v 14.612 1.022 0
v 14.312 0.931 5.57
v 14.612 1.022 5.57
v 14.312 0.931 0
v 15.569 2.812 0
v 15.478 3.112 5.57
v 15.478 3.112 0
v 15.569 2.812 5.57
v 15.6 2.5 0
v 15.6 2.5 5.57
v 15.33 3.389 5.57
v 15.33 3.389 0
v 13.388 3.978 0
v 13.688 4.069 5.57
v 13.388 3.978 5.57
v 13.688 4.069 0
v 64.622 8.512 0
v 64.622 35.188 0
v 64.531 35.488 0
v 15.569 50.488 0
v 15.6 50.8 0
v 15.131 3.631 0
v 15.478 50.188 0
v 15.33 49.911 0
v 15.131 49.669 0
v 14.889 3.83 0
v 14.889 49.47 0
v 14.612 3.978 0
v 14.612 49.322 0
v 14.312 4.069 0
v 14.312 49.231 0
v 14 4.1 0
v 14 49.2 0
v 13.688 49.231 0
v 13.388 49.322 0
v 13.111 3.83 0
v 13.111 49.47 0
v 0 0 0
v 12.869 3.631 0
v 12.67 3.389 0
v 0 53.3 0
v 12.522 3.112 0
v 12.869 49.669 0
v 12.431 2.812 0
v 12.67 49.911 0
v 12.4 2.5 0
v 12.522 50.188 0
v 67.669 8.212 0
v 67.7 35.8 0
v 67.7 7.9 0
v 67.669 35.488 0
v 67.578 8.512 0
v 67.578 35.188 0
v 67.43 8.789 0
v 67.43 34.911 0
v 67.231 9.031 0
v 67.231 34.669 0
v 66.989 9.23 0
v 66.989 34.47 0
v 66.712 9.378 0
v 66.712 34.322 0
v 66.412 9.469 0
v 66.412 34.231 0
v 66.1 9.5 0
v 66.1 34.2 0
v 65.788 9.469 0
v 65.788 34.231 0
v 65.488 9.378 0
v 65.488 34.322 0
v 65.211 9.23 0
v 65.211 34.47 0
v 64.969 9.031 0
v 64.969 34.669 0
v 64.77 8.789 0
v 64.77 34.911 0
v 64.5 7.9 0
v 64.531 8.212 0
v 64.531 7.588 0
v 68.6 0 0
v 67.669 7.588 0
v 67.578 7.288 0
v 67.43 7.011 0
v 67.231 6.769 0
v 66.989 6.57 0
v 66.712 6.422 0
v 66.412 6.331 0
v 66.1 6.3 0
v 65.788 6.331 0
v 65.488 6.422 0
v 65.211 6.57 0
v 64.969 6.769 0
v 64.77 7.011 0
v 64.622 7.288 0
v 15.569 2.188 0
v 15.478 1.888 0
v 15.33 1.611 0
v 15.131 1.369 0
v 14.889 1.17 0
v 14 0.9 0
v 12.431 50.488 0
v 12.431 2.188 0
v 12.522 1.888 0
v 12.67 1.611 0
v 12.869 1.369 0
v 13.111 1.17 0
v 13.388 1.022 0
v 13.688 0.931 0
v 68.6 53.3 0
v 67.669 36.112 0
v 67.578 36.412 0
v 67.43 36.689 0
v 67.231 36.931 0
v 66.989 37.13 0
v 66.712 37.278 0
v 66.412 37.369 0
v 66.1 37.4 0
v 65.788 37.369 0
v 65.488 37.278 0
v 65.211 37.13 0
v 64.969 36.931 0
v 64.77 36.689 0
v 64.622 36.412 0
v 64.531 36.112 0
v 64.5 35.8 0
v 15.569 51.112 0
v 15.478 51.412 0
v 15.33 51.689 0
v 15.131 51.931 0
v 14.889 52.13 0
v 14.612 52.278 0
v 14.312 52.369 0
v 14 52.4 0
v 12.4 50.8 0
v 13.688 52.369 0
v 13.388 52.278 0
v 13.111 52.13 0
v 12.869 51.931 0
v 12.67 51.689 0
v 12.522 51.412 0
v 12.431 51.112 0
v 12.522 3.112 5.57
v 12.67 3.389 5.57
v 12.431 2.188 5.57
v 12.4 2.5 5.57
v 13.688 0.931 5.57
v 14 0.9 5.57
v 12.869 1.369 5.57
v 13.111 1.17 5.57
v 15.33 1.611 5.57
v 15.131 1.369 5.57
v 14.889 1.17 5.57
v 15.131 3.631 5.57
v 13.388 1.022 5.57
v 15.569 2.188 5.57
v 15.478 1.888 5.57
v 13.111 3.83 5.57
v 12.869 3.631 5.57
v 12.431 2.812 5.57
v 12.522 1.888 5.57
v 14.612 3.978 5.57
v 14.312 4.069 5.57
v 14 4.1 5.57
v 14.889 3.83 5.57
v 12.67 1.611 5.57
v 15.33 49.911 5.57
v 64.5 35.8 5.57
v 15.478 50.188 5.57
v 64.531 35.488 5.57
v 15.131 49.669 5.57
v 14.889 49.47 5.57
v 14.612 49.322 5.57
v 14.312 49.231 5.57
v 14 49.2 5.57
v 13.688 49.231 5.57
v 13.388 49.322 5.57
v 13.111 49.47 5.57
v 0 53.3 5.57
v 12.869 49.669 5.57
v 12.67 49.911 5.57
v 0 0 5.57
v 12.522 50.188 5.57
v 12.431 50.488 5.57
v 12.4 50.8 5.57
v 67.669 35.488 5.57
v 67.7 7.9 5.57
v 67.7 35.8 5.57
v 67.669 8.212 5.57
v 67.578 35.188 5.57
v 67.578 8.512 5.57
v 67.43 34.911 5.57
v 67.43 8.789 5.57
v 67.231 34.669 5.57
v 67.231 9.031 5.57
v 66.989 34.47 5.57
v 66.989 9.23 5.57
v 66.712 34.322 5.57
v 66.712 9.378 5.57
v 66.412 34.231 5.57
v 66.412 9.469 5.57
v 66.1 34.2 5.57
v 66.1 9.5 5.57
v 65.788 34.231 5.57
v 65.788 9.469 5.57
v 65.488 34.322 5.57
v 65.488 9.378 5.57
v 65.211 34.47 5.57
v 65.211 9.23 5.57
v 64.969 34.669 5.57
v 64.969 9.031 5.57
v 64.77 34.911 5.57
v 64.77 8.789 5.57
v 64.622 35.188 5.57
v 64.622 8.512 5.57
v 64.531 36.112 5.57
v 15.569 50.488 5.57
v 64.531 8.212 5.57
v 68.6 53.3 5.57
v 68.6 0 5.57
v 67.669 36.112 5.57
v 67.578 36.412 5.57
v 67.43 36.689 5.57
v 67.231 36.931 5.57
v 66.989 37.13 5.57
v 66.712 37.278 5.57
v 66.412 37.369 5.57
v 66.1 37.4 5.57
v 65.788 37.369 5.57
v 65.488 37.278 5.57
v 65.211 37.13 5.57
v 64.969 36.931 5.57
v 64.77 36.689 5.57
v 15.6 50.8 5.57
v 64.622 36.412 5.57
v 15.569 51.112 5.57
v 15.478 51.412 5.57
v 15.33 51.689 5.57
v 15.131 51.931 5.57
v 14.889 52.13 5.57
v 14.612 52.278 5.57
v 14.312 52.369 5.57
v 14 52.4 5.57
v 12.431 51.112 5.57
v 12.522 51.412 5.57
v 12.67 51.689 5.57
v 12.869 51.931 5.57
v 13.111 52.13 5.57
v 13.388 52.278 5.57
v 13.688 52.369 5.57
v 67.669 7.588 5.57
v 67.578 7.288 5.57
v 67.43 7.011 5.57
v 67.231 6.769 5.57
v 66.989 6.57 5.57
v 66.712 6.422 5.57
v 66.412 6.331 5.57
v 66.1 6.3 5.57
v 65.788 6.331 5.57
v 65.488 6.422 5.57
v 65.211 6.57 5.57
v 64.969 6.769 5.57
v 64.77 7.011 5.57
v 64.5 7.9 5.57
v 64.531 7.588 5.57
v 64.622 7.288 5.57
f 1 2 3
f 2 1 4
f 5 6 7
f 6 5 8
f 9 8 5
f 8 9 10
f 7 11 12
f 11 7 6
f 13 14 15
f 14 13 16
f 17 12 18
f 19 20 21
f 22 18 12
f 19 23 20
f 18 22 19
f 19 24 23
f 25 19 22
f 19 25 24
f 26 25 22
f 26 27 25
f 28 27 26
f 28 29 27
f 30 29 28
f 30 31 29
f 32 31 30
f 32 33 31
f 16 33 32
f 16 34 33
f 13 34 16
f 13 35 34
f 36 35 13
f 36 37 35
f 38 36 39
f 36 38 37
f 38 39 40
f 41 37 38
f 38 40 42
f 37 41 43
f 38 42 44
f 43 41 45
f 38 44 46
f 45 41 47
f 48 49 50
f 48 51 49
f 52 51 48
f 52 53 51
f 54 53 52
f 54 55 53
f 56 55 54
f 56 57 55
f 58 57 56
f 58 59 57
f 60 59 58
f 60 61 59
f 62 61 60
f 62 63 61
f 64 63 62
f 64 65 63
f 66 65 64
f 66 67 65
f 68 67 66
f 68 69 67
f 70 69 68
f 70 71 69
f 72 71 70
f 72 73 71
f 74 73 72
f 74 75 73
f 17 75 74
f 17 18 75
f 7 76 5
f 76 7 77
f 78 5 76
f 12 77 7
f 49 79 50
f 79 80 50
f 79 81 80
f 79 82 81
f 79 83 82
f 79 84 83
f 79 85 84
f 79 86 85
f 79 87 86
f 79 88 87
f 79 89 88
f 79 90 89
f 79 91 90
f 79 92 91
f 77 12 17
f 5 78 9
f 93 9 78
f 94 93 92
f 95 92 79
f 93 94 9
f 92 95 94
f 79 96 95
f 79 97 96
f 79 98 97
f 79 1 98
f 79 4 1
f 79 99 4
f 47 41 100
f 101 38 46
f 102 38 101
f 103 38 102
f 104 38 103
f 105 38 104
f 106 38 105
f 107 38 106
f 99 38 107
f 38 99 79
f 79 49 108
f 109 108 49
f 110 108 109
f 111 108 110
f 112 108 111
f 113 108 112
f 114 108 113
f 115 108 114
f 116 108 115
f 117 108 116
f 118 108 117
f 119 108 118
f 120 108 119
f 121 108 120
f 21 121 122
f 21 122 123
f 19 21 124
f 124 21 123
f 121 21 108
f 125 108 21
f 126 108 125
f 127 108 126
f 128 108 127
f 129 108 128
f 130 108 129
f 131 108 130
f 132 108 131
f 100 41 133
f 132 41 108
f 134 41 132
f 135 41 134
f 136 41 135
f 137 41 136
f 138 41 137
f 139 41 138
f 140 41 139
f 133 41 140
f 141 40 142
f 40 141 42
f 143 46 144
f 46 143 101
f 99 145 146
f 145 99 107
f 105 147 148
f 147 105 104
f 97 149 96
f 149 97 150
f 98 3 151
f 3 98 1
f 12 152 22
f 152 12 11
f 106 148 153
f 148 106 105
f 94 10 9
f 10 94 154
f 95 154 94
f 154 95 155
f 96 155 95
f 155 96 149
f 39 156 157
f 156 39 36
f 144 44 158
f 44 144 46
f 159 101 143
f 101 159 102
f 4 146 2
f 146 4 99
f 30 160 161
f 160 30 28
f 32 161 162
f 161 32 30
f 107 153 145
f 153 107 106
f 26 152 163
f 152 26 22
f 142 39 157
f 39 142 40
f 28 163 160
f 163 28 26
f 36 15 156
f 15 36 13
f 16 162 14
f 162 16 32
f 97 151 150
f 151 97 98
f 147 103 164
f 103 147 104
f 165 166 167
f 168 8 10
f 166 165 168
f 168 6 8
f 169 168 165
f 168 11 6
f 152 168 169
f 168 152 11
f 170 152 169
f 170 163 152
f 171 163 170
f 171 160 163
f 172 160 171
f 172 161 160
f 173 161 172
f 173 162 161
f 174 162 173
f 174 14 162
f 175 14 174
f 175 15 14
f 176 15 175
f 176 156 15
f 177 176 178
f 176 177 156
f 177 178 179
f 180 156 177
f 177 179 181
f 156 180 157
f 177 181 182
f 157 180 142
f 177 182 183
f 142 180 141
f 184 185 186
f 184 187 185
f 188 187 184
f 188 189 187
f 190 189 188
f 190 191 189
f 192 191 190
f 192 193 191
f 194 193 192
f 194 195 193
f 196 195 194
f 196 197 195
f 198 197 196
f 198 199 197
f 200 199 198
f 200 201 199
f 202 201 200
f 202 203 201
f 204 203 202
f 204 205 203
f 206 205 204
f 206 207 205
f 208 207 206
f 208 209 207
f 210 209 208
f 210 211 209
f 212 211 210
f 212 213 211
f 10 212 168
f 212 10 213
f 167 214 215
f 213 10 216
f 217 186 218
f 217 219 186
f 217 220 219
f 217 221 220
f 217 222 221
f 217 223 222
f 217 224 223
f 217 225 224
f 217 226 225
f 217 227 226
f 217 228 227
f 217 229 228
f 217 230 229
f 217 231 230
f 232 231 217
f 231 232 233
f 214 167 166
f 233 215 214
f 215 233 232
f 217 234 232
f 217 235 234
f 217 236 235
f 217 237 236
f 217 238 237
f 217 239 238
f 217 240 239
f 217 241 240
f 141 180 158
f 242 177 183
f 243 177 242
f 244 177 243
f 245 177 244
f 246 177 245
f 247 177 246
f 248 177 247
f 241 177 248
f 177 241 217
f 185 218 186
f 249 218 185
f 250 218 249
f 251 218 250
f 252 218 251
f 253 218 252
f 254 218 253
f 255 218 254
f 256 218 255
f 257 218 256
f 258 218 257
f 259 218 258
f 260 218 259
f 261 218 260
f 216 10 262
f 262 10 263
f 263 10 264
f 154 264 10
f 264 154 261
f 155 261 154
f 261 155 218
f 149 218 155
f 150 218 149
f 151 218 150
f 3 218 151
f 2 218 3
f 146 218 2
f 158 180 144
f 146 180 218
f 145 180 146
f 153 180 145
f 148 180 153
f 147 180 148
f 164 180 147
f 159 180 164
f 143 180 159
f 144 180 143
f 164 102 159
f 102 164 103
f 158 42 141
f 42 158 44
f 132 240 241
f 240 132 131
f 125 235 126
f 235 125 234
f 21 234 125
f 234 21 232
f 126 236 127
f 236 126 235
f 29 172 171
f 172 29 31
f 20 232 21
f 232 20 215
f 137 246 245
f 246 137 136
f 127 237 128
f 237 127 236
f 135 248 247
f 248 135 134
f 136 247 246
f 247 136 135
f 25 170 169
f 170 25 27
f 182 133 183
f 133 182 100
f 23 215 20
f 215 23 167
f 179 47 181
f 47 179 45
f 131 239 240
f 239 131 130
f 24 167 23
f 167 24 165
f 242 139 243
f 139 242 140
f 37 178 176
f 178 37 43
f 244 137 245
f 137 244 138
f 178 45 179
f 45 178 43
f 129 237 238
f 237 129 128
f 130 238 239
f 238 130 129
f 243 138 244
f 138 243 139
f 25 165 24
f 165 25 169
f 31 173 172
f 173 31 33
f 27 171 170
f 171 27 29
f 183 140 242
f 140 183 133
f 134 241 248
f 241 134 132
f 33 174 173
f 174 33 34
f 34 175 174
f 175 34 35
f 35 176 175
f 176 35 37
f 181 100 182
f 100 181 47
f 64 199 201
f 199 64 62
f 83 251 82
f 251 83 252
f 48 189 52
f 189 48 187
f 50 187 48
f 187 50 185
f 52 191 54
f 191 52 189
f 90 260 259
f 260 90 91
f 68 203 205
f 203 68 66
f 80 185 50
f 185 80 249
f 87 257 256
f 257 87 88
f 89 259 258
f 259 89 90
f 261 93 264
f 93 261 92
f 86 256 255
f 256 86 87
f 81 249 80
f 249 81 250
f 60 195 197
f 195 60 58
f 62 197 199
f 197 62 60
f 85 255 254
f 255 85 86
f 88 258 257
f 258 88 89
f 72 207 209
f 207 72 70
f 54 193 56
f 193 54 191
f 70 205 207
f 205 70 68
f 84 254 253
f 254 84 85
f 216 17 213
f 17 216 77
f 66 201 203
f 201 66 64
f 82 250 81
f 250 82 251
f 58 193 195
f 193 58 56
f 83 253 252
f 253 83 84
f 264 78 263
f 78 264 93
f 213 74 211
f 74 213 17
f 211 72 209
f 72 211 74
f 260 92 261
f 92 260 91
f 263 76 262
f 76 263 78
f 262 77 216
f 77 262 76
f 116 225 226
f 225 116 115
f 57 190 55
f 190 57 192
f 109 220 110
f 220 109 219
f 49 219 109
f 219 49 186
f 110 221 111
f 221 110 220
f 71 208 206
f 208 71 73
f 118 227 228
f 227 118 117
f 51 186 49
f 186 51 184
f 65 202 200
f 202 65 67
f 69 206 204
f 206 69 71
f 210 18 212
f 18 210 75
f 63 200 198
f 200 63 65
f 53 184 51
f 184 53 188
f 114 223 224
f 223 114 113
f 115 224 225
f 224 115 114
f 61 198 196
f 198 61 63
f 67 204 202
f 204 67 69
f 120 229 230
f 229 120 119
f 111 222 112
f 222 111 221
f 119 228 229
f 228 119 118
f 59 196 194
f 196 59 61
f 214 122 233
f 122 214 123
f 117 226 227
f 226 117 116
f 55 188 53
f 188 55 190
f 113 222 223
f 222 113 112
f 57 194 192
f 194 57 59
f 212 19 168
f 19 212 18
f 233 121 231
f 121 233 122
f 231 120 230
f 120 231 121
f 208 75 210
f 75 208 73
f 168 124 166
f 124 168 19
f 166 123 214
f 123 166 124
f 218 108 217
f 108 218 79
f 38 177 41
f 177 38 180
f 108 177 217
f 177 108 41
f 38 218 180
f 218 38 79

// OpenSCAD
// https://www.pololu.com/product/3113/resources
// https://www.pololu.com/file/0J1145/a-star-32u4-prime-sv-dimension-diagram.pdf

$fn=32;

board_width = 68.6;
board_height = 53.3;

difference()
{
cube([board_width, board_height, 1.57+4]);

secure_pos = [[14, 2.5, 0], [14, board_height-2.5, 0], [board_width-2.5, 7.9, 0], [board_width-2.5, 7.9+27.9, 0]];
for (i = [0:3])
{
    translate(secure_pos[i])
    cylinder(1.57+4, 3.2/2, 3.2/2);
}
}
